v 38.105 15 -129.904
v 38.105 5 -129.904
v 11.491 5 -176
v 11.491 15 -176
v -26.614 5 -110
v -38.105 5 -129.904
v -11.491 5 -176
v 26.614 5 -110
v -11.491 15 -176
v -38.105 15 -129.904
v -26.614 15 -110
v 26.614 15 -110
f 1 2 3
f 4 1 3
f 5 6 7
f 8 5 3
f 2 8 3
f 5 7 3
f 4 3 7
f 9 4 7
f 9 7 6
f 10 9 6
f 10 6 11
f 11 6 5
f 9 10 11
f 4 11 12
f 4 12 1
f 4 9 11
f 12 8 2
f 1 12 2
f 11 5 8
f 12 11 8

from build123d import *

# Parameters (mm, degrees)
EXTRUDE_1_DEPTH     = 5
FILLET_1_R          = 20
EXTRUDE_2_DEPTH     = 10
SKETCH_3_W          = 458.835277925
SKETCH_3_H          = 325.644744519
CUT_EXTRUDE_1_DEPTH = 10


with BuildPart() as part:
    # 草圖1 → 填料-伸長1 (new body)
    with BuildSketch(Plane(origin=(0, 0, 0), x_dir=(1, 0, 0), z_dir=(0, 1, 0))):
        Polygon((-90.122176988, 0), (90.122176988, 0), (165.122176988, 129.903810568), (75, 286), (-75, 286), (-165.122176988, 129.903810568), align=None)
    extrude(amount=EXTRUDE_1_DEPTH)

    # 圓角1
    fillet_1_edges = [part.edges().sort_by_distance(p)[0] for p in [
        (-165.122176988, 2.5, -129.903810568),
        (-75, 2.5, -286),
        (75, 2.5, -286),
        (165.122176988, 2.5, -129.903810568),
        (90.122176988, 2.5, 0),
        (-90.122176988, 2.5, 0),
    ]]
    fillet(fillet_1_edges, radius=FILLET_1_R)

    # 草圖2 → 填料-伸長2 (add)
    with BuildSketch(Plane(origin=(0, 5, 0), x_dir=(1, 0, 0), z_dir=(0, 1, 0))):
        Polygon((-26.613647377, 110), (26.613647377, 110), (38.105117767, 129.903810568), (11.491470389, 176), (-11.491470389, 176), (-38.105117767, 129.903810568), align=None)
    extrude(amount=EXTRUDE_2_DEPTH)

    # 草圖3 → 除料-伸長1 (cut)
    with BuildSketch(Plane(origin=(0, 5, 0), x_dir=(1, 0, 0), z_dir=(0, 1, 0))):
        with Locations((11.913832117, 140.556137002)):
            Rectangle(SKETCH_3_W, SKETCH_3_H)
    extrude(amount=-CUT_EXTRUDE_1_DEPTH, mode=Mode.SUBTRACT)


solid = part.part
